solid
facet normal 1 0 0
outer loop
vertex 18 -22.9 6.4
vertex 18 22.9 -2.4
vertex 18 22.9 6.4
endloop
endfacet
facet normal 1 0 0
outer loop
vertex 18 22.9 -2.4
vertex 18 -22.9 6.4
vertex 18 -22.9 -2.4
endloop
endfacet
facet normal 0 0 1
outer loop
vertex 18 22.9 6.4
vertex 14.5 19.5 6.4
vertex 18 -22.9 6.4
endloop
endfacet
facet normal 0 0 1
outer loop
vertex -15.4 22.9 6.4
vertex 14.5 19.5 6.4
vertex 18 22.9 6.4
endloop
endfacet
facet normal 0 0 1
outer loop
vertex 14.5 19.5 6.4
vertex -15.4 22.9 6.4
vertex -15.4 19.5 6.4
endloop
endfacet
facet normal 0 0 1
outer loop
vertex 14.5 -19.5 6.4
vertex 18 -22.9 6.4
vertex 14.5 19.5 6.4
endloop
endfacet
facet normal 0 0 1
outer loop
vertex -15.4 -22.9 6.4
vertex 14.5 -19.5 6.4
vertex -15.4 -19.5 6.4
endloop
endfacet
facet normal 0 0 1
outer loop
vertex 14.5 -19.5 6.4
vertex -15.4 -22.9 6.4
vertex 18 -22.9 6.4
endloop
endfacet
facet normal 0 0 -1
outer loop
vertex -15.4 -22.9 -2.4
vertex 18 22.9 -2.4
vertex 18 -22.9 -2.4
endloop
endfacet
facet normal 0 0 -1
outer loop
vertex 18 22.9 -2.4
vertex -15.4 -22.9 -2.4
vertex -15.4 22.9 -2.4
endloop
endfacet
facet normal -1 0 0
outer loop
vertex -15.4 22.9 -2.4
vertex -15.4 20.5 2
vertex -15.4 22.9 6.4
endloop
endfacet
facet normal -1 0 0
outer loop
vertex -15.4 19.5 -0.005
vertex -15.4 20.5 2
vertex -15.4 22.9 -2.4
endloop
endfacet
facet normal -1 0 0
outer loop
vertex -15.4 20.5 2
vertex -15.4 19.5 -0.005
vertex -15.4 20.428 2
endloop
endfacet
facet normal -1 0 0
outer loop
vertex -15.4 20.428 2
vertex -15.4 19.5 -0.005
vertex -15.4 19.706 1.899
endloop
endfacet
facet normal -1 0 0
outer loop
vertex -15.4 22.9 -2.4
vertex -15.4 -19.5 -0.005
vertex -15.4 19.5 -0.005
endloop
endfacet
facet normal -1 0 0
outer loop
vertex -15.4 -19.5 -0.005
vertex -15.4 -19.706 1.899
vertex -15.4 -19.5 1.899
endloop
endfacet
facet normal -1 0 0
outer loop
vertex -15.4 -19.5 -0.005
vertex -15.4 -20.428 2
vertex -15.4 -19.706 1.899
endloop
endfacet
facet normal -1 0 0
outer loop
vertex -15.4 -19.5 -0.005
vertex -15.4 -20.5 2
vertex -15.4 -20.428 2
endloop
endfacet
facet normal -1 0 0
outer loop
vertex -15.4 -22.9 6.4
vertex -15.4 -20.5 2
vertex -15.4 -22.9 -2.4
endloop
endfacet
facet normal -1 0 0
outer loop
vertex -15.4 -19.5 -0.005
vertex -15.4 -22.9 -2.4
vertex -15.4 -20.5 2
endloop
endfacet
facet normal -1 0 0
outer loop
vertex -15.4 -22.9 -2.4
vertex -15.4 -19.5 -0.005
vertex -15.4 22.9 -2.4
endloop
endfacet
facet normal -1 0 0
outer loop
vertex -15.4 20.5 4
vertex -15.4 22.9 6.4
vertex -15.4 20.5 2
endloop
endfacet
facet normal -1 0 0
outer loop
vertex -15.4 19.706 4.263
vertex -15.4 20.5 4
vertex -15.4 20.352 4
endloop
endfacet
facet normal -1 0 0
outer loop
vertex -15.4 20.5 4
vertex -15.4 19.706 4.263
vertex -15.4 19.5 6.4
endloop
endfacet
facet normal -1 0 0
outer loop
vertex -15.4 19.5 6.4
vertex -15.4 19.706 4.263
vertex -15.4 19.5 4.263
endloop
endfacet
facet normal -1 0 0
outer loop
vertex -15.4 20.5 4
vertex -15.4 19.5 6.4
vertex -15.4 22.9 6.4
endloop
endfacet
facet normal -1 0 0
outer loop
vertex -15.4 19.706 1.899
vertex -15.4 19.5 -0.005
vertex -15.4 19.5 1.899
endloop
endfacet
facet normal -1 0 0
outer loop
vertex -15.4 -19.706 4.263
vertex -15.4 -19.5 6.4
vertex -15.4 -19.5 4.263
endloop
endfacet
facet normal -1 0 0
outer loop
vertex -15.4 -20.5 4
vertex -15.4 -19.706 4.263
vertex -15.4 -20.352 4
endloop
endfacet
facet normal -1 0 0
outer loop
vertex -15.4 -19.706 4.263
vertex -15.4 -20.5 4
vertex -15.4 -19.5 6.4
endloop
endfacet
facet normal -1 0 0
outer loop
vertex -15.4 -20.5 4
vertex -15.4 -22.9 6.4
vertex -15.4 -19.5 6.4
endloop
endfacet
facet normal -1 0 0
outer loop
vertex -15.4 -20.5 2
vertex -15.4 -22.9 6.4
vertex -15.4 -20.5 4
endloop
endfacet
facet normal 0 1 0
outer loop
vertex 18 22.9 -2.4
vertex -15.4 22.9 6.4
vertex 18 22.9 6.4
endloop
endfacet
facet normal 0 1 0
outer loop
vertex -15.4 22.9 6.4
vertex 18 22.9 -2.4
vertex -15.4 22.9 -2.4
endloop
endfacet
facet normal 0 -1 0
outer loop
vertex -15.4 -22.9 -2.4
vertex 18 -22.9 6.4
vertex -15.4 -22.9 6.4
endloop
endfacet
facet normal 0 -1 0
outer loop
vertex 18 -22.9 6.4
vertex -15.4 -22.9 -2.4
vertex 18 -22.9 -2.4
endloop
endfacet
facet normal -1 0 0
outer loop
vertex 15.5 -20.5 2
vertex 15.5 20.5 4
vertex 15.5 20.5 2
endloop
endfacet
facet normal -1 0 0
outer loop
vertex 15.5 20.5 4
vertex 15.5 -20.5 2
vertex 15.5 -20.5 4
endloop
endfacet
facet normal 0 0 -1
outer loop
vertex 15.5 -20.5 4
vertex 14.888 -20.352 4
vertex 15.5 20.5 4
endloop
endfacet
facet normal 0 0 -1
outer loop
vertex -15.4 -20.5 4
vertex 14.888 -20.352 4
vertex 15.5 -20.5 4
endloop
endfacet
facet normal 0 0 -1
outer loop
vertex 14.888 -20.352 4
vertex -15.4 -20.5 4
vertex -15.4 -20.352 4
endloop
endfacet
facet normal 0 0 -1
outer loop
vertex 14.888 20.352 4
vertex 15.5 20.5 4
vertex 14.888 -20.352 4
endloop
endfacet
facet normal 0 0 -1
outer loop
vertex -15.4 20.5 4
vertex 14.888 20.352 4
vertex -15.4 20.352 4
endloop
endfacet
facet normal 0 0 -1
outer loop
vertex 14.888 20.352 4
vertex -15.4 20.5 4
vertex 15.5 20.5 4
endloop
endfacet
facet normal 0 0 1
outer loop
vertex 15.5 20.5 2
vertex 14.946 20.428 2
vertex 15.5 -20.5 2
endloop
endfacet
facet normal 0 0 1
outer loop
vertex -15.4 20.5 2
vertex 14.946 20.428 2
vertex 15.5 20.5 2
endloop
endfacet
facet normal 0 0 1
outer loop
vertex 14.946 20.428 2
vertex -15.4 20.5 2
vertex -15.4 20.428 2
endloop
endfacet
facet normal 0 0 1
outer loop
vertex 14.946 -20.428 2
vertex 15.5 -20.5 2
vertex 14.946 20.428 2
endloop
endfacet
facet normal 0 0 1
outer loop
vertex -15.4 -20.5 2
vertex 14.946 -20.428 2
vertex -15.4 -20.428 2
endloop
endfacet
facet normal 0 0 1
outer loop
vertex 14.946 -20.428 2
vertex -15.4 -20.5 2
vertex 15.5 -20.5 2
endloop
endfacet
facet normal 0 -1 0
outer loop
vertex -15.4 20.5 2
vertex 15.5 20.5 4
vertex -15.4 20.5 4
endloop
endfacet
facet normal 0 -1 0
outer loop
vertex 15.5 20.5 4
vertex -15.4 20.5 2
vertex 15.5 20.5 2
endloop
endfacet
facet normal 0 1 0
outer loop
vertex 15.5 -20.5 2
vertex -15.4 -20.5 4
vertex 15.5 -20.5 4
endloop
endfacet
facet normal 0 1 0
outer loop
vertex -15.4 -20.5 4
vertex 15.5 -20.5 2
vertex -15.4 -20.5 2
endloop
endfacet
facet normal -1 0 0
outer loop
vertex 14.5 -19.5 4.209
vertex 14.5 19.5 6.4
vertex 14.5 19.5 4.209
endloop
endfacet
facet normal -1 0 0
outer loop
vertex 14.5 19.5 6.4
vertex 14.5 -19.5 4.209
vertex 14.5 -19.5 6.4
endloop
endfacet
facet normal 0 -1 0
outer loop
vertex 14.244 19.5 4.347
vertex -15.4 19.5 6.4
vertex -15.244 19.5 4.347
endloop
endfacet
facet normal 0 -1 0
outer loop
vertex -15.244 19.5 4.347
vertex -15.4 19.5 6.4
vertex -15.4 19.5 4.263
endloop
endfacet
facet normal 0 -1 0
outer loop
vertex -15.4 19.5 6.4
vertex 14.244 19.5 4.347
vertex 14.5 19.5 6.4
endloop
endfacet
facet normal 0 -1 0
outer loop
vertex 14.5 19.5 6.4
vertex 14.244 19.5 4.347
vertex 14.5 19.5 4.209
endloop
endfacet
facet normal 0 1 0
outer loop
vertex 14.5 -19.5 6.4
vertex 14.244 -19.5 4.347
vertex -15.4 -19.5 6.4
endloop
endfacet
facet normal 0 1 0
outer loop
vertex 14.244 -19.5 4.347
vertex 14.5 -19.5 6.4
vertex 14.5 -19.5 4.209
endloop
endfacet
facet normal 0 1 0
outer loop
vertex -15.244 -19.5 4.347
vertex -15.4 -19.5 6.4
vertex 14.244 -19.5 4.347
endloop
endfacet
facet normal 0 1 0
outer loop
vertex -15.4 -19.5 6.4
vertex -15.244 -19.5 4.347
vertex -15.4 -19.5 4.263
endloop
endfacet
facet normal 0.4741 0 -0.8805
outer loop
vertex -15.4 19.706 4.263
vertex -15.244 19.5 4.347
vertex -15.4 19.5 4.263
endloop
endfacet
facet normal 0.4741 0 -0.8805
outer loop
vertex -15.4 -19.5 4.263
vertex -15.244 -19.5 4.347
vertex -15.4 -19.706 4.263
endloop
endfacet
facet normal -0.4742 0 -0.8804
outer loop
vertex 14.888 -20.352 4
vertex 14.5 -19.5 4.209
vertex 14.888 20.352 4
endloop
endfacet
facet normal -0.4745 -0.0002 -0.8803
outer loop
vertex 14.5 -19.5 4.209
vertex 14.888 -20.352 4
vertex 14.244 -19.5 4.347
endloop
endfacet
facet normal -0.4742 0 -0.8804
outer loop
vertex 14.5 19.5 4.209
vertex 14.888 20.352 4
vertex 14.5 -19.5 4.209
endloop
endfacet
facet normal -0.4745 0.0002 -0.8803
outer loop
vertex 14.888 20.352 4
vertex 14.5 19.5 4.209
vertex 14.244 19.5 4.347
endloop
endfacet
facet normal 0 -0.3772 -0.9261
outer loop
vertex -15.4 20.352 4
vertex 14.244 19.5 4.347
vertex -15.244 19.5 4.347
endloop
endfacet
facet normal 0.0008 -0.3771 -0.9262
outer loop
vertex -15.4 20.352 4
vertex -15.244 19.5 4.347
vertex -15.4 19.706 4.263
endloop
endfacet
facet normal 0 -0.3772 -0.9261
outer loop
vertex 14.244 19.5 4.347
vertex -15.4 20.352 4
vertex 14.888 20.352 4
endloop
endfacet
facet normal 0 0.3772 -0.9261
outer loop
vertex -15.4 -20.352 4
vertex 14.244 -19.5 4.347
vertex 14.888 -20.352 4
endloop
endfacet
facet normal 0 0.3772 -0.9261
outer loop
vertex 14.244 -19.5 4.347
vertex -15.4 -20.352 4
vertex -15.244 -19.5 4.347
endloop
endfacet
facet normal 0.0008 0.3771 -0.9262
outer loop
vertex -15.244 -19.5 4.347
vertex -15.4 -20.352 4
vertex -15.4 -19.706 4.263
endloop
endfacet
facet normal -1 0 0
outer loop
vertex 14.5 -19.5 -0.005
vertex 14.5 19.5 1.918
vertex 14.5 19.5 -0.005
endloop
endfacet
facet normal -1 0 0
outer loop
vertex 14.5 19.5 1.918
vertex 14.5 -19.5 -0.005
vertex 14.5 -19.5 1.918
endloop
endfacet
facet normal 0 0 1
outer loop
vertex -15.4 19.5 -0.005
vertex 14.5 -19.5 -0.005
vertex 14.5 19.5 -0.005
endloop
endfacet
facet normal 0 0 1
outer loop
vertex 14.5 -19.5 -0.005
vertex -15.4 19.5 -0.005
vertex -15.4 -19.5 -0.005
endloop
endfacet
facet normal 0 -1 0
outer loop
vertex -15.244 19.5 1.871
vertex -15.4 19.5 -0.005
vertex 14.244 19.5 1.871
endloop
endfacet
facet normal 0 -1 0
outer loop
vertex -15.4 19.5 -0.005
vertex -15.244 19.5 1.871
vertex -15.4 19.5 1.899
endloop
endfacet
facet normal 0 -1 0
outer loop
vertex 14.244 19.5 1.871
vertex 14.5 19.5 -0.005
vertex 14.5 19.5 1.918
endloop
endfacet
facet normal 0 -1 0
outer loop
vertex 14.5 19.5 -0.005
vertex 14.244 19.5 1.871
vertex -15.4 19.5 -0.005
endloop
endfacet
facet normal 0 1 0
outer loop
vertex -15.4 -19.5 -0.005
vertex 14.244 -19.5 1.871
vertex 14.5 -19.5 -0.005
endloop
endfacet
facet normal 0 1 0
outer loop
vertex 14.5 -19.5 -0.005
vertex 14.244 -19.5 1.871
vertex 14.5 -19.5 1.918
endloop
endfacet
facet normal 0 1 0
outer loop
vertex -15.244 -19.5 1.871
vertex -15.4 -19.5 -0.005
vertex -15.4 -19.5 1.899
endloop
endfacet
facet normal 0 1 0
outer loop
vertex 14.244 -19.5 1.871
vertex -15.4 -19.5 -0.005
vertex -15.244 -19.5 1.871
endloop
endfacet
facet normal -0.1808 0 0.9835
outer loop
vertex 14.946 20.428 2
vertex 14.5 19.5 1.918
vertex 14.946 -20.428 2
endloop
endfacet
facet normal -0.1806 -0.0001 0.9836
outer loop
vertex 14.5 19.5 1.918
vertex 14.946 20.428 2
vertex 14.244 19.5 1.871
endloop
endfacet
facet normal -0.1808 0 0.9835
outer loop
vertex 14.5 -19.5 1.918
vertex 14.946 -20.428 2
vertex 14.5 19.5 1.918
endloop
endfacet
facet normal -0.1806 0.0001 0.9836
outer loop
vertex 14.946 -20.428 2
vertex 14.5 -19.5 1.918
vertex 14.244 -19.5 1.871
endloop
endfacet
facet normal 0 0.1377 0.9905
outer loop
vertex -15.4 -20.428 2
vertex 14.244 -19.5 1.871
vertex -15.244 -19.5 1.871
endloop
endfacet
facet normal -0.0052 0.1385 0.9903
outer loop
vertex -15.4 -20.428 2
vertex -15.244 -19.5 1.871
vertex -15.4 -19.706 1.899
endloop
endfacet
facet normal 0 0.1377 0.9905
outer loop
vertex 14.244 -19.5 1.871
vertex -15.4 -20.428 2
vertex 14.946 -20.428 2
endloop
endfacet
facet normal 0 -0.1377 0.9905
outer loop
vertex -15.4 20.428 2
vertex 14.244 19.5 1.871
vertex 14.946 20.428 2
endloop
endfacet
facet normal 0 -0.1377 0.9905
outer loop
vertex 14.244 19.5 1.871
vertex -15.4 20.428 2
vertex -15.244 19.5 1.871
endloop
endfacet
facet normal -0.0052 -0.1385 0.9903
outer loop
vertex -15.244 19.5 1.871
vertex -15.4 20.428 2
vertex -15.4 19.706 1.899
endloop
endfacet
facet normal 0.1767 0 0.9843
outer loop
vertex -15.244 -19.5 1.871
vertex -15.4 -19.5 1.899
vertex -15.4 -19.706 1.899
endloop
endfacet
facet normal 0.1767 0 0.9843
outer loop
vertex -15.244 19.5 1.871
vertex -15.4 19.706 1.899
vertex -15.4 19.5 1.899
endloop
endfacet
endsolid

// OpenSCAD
// preview[view:west, tilt:top diagonal]
module pcb_holder(
pcb_height=31,
pcb_width=41,
pcb_thick=2,
grove=1,
walls=2.4,
bottom_offset=2,
chamfer_top=7,//[0:10]
chamfer_bottom=3//[0:10]
) {

chamfer_top_=chamfer_top/10;
chamfer_bottom_=chamfer_bottom/10;

difference(){
  //box
  translate([walls/2+0.1,0,pcb_thick/2+bottom_offset/2]){
    cube([pcb_height+walls,pcb_width+walls*2,pcb_thick+walls*2+bottom_offset],center=true);
  }

  //pcb
  color("green")
    translate([0,0,pcb_thick/2+bottom_offset]){
      cube([pcb_height,pcb_width,pcb_thick],center=true);
    }

  //grove
  color("blue")
    translate([-grove/2,0,pcb_thick+walls/2+bottom_offset]){
      cube([pcb_height-grove,pcb_width-grove*2,walls+0.01],center=true);
    }


  //chamfer top
  color("red")
    translate([-grove/2,0,pcb_thick+walls/2+bottom_offset-0.01]){
      linear_extrude(height = walls+0.1, center = true, convexity = 3, scale = chamfer_top_){
      square(size = [pcb_height, pcb_width], center = true);
    }
  }

  //bottom offset
  color("Gray")
    translate([-grove/2,0,bottom_offset/2]){
      cube([pcb_height-grove,pcb_width-grove*2,bottom_offset+0.01],center=true);
    }

  //chamfer bottom
  color("Purple")
    translate([-grove/2,0,bottom_offset/2+0.01]) {
      mirror([0,0,1]) 
        linear_extrude(height = bottom_offset, center = true, convexity = 3, scale = chamfer_bottom_) {
          square(size = [pcb_height, pcb_width], center = true);
        }
    }
  }
}

pcb_holder();
